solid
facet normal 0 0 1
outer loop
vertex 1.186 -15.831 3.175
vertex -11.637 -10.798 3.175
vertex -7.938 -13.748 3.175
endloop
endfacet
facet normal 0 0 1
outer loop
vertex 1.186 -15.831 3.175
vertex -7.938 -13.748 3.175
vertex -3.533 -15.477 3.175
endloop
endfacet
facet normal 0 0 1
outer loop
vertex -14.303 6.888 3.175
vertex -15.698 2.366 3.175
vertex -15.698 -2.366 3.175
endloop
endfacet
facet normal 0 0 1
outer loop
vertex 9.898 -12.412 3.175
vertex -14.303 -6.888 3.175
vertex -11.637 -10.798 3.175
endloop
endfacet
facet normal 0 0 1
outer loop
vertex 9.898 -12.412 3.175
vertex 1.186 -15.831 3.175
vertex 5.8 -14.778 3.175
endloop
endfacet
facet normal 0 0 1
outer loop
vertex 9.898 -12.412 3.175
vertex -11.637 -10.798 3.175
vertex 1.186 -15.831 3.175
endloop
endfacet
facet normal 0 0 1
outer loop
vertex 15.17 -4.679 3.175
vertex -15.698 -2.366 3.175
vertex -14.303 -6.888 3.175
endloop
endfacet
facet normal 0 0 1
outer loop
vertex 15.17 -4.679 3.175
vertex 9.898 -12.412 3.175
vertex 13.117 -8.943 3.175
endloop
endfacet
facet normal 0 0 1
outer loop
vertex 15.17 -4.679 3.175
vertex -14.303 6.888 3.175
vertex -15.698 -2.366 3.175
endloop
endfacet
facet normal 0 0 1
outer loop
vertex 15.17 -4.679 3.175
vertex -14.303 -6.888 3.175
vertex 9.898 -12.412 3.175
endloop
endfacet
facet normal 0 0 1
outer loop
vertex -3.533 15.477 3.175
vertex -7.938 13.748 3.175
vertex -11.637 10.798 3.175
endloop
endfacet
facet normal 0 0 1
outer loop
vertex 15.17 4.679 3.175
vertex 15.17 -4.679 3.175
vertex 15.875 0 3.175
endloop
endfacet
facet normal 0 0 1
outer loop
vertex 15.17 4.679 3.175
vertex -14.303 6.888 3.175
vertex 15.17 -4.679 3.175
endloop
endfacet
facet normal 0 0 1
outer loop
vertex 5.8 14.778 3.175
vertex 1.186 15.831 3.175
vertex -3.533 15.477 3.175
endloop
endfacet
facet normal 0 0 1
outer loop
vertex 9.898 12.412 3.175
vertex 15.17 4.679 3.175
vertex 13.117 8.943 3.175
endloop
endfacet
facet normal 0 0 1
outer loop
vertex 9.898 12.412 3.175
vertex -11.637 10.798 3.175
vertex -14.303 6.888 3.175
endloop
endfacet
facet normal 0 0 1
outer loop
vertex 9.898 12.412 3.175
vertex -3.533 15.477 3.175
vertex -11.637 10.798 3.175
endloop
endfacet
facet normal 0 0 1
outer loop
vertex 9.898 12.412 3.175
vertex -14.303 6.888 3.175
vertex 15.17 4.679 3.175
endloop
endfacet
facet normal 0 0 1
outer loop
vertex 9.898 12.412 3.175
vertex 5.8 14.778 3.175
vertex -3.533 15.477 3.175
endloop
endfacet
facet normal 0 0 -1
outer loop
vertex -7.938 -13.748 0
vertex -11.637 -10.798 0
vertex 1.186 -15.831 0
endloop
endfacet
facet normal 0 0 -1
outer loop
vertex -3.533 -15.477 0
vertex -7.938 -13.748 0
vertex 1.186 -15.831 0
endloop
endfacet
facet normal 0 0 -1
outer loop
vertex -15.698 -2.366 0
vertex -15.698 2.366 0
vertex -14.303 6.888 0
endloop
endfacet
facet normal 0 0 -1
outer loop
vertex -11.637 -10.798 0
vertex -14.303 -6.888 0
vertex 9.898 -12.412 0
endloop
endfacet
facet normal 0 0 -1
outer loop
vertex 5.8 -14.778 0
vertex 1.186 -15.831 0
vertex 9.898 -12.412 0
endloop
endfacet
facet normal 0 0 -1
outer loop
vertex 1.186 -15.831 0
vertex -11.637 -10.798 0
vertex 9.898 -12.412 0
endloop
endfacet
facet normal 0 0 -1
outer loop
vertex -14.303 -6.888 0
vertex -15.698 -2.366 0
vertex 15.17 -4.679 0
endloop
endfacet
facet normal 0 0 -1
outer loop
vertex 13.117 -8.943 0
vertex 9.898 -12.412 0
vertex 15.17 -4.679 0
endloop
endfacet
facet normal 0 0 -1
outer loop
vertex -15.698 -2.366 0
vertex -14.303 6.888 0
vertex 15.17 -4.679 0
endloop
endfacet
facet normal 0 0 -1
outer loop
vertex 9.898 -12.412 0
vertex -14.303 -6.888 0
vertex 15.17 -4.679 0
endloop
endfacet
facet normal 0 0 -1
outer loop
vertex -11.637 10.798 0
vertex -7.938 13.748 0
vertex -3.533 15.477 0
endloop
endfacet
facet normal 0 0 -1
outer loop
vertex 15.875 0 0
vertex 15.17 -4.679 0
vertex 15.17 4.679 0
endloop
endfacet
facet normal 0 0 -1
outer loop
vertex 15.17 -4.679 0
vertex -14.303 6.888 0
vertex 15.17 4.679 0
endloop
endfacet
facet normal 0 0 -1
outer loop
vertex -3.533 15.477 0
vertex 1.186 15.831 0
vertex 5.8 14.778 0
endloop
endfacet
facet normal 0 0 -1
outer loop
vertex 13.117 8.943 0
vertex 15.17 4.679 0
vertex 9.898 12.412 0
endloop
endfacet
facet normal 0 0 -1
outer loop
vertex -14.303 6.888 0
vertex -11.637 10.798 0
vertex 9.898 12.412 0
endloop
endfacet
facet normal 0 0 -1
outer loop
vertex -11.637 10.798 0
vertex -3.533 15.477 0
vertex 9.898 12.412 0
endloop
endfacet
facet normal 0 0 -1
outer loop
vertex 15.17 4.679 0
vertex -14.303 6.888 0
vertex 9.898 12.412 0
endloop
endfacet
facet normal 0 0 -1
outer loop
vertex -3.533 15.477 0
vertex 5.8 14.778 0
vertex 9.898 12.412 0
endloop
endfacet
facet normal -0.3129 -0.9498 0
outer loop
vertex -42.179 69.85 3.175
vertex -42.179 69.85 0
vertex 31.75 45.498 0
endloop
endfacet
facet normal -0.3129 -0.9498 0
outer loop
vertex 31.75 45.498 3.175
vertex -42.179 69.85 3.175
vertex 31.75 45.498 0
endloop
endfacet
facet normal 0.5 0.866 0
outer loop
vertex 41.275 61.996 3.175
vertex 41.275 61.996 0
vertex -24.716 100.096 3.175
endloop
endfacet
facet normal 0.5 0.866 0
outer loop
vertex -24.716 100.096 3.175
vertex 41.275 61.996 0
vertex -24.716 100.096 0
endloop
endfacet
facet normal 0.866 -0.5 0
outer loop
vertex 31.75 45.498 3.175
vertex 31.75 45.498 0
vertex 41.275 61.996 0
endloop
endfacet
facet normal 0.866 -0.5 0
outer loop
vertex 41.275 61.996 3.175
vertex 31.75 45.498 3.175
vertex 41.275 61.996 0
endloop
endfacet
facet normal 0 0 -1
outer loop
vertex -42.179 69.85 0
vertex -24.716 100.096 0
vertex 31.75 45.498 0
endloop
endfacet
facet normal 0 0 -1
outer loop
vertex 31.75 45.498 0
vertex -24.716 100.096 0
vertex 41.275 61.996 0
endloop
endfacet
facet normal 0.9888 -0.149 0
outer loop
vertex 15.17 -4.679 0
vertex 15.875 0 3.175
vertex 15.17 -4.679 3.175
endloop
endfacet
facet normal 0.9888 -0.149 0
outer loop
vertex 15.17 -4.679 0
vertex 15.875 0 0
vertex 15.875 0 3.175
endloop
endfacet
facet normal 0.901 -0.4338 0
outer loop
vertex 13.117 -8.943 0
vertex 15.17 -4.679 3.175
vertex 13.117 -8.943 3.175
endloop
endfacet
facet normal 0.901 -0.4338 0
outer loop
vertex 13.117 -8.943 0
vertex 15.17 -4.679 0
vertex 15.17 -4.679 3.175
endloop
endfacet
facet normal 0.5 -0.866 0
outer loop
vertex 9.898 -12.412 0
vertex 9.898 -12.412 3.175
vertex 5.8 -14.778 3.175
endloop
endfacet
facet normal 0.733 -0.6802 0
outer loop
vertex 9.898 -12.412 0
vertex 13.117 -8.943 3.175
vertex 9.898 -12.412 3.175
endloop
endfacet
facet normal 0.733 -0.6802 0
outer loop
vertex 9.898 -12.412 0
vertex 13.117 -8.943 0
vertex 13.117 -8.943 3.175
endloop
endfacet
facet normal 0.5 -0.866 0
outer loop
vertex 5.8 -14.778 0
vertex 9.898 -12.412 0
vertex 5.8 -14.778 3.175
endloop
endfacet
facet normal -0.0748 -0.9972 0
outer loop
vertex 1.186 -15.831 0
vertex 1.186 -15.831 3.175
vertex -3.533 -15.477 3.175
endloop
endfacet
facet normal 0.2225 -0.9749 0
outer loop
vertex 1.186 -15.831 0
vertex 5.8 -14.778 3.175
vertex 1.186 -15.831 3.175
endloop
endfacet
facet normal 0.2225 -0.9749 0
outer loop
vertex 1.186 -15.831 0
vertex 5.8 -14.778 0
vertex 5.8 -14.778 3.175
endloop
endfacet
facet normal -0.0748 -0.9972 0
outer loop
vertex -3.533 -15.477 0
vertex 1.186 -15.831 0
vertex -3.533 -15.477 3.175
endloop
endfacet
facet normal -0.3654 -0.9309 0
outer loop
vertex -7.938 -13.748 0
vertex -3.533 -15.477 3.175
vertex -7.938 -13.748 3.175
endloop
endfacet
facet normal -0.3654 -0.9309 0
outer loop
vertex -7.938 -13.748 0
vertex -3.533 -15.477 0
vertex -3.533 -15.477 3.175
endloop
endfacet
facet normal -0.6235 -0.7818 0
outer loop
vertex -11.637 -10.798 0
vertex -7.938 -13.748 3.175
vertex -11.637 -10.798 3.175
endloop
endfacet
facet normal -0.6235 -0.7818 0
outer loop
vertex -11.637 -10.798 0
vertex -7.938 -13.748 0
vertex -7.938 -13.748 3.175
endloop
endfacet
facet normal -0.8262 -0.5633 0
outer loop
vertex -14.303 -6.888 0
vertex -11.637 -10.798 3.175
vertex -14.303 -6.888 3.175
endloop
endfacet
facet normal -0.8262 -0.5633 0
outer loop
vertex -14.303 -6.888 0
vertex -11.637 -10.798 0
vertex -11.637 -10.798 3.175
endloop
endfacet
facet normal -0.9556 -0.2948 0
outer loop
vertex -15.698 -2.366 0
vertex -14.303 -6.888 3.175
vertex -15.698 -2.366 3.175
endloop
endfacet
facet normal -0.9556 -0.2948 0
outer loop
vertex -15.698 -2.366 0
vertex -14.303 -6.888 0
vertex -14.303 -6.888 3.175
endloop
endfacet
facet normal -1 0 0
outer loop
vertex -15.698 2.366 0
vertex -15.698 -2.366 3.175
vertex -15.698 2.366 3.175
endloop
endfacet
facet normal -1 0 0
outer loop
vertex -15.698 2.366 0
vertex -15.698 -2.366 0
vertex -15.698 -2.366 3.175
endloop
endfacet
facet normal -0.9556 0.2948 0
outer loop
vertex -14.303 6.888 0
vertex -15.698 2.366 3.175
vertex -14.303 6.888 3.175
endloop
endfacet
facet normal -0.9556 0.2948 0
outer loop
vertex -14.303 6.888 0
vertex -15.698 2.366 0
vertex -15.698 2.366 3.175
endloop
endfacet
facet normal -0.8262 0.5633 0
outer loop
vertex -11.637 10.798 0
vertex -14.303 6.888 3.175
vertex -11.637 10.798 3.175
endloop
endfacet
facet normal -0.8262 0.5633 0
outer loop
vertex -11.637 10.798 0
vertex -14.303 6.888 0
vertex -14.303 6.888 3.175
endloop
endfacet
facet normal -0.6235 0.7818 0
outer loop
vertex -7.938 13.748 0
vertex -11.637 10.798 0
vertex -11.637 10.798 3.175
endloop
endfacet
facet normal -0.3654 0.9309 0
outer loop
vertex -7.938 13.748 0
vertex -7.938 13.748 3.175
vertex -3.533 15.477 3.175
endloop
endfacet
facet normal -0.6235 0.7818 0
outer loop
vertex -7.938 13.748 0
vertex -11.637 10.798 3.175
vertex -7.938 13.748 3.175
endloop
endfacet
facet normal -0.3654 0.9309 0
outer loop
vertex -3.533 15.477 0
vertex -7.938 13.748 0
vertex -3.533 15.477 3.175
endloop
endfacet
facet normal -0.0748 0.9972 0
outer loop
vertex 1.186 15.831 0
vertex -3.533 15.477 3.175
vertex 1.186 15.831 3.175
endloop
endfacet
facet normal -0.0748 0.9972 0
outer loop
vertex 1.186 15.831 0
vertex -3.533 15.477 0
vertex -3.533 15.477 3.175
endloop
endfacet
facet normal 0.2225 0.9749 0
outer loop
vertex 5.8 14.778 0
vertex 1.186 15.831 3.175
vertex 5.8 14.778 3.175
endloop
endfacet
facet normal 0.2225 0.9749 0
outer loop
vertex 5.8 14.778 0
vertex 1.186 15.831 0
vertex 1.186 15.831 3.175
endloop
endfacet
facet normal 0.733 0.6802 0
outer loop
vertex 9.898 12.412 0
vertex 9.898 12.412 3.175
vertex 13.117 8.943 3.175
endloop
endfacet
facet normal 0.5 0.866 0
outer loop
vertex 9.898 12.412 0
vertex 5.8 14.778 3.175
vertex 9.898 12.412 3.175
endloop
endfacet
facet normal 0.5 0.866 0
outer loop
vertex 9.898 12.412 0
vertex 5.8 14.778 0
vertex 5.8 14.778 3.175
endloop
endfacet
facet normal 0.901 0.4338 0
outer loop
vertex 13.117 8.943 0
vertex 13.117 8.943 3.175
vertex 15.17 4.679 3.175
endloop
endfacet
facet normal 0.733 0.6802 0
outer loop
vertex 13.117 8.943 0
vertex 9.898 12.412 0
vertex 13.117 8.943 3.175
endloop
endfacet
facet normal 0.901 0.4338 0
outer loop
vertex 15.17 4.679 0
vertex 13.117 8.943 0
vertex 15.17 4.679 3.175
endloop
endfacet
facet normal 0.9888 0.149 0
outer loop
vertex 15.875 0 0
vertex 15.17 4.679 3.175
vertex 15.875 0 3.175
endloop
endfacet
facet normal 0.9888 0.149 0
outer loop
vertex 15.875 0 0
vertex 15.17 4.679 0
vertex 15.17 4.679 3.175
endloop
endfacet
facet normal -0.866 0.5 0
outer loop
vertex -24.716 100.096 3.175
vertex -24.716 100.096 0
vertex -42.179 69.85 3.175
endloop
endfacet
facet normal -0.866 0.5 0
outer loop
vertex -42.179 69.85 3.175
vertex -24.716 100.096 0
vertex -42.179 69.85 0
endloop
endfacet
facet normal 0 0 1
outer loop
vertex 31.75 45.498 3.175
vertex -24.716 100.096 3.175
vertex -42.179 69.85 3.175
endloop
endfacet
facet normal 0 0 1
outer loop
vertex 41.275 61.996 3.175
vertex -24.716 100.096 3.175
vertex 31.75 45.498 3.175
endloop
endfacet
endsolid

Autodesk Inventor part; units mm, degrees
ref_plane "YZ Plane" through (0, 0, 0) normal (1, 0, 0) x (0, 1, 0)
ref_plane "XZ Plane" through (0, 0, 0) normal (0, 1, 0) x (-1, 0, 0)
ref_plane "XY Plane" through (0, 0, 0) normal (0, 0, 1) x (1, 0, 0)
sketch "Sketch1" plane through (0, 0, 0) normal (0, 0, 1) x (1, 0, 0)
  circle A0 centre (0, 0) radius 15.875
  line L0 (18.3309, 31.75) -> (36.6617, 0) construction
  line L1 (36.6617, 0) -> (18.3309, -31.75) construction
  line L2 (18.3309, -31.75) -> (-18.3309, -31.75) construction
  line L3 (-18.3309, -31.75) -> (-36.6617, 0) construction
  line L4 (-36.6617, 0) -> (-18.3309, 31.75) construction
  line L5 (-18.3309, 31.75) -> (18.3309, 31.75) construction
  line L6 (-42.1786, 69.85) -> (31.75, 45.4982)
  line L7 (31.75, 45.4982) -> (41.275, 61.9959)
  line L8 (41.275, 61.9959) -> (-24.7161, 100.0959)
  line L9 (-24.7161, 100.0959) -> (-42.1786, 69.85)
  line L10 (0, 0) -> (69.4257, 0) construction
  dimension "d5" = 31.75
  dimension "d6" = 63.5
  dimension "d7" = 76.2
  dimension "d8" = 19.05
  dimension "d9" = 34.925
  dimension "d10" = 69.85
  dimension "d11" = 31.75
extrude "Extrusion1" add sketch "Sketch1" along normal blind 3.175
properties part number "mean machine brow"
